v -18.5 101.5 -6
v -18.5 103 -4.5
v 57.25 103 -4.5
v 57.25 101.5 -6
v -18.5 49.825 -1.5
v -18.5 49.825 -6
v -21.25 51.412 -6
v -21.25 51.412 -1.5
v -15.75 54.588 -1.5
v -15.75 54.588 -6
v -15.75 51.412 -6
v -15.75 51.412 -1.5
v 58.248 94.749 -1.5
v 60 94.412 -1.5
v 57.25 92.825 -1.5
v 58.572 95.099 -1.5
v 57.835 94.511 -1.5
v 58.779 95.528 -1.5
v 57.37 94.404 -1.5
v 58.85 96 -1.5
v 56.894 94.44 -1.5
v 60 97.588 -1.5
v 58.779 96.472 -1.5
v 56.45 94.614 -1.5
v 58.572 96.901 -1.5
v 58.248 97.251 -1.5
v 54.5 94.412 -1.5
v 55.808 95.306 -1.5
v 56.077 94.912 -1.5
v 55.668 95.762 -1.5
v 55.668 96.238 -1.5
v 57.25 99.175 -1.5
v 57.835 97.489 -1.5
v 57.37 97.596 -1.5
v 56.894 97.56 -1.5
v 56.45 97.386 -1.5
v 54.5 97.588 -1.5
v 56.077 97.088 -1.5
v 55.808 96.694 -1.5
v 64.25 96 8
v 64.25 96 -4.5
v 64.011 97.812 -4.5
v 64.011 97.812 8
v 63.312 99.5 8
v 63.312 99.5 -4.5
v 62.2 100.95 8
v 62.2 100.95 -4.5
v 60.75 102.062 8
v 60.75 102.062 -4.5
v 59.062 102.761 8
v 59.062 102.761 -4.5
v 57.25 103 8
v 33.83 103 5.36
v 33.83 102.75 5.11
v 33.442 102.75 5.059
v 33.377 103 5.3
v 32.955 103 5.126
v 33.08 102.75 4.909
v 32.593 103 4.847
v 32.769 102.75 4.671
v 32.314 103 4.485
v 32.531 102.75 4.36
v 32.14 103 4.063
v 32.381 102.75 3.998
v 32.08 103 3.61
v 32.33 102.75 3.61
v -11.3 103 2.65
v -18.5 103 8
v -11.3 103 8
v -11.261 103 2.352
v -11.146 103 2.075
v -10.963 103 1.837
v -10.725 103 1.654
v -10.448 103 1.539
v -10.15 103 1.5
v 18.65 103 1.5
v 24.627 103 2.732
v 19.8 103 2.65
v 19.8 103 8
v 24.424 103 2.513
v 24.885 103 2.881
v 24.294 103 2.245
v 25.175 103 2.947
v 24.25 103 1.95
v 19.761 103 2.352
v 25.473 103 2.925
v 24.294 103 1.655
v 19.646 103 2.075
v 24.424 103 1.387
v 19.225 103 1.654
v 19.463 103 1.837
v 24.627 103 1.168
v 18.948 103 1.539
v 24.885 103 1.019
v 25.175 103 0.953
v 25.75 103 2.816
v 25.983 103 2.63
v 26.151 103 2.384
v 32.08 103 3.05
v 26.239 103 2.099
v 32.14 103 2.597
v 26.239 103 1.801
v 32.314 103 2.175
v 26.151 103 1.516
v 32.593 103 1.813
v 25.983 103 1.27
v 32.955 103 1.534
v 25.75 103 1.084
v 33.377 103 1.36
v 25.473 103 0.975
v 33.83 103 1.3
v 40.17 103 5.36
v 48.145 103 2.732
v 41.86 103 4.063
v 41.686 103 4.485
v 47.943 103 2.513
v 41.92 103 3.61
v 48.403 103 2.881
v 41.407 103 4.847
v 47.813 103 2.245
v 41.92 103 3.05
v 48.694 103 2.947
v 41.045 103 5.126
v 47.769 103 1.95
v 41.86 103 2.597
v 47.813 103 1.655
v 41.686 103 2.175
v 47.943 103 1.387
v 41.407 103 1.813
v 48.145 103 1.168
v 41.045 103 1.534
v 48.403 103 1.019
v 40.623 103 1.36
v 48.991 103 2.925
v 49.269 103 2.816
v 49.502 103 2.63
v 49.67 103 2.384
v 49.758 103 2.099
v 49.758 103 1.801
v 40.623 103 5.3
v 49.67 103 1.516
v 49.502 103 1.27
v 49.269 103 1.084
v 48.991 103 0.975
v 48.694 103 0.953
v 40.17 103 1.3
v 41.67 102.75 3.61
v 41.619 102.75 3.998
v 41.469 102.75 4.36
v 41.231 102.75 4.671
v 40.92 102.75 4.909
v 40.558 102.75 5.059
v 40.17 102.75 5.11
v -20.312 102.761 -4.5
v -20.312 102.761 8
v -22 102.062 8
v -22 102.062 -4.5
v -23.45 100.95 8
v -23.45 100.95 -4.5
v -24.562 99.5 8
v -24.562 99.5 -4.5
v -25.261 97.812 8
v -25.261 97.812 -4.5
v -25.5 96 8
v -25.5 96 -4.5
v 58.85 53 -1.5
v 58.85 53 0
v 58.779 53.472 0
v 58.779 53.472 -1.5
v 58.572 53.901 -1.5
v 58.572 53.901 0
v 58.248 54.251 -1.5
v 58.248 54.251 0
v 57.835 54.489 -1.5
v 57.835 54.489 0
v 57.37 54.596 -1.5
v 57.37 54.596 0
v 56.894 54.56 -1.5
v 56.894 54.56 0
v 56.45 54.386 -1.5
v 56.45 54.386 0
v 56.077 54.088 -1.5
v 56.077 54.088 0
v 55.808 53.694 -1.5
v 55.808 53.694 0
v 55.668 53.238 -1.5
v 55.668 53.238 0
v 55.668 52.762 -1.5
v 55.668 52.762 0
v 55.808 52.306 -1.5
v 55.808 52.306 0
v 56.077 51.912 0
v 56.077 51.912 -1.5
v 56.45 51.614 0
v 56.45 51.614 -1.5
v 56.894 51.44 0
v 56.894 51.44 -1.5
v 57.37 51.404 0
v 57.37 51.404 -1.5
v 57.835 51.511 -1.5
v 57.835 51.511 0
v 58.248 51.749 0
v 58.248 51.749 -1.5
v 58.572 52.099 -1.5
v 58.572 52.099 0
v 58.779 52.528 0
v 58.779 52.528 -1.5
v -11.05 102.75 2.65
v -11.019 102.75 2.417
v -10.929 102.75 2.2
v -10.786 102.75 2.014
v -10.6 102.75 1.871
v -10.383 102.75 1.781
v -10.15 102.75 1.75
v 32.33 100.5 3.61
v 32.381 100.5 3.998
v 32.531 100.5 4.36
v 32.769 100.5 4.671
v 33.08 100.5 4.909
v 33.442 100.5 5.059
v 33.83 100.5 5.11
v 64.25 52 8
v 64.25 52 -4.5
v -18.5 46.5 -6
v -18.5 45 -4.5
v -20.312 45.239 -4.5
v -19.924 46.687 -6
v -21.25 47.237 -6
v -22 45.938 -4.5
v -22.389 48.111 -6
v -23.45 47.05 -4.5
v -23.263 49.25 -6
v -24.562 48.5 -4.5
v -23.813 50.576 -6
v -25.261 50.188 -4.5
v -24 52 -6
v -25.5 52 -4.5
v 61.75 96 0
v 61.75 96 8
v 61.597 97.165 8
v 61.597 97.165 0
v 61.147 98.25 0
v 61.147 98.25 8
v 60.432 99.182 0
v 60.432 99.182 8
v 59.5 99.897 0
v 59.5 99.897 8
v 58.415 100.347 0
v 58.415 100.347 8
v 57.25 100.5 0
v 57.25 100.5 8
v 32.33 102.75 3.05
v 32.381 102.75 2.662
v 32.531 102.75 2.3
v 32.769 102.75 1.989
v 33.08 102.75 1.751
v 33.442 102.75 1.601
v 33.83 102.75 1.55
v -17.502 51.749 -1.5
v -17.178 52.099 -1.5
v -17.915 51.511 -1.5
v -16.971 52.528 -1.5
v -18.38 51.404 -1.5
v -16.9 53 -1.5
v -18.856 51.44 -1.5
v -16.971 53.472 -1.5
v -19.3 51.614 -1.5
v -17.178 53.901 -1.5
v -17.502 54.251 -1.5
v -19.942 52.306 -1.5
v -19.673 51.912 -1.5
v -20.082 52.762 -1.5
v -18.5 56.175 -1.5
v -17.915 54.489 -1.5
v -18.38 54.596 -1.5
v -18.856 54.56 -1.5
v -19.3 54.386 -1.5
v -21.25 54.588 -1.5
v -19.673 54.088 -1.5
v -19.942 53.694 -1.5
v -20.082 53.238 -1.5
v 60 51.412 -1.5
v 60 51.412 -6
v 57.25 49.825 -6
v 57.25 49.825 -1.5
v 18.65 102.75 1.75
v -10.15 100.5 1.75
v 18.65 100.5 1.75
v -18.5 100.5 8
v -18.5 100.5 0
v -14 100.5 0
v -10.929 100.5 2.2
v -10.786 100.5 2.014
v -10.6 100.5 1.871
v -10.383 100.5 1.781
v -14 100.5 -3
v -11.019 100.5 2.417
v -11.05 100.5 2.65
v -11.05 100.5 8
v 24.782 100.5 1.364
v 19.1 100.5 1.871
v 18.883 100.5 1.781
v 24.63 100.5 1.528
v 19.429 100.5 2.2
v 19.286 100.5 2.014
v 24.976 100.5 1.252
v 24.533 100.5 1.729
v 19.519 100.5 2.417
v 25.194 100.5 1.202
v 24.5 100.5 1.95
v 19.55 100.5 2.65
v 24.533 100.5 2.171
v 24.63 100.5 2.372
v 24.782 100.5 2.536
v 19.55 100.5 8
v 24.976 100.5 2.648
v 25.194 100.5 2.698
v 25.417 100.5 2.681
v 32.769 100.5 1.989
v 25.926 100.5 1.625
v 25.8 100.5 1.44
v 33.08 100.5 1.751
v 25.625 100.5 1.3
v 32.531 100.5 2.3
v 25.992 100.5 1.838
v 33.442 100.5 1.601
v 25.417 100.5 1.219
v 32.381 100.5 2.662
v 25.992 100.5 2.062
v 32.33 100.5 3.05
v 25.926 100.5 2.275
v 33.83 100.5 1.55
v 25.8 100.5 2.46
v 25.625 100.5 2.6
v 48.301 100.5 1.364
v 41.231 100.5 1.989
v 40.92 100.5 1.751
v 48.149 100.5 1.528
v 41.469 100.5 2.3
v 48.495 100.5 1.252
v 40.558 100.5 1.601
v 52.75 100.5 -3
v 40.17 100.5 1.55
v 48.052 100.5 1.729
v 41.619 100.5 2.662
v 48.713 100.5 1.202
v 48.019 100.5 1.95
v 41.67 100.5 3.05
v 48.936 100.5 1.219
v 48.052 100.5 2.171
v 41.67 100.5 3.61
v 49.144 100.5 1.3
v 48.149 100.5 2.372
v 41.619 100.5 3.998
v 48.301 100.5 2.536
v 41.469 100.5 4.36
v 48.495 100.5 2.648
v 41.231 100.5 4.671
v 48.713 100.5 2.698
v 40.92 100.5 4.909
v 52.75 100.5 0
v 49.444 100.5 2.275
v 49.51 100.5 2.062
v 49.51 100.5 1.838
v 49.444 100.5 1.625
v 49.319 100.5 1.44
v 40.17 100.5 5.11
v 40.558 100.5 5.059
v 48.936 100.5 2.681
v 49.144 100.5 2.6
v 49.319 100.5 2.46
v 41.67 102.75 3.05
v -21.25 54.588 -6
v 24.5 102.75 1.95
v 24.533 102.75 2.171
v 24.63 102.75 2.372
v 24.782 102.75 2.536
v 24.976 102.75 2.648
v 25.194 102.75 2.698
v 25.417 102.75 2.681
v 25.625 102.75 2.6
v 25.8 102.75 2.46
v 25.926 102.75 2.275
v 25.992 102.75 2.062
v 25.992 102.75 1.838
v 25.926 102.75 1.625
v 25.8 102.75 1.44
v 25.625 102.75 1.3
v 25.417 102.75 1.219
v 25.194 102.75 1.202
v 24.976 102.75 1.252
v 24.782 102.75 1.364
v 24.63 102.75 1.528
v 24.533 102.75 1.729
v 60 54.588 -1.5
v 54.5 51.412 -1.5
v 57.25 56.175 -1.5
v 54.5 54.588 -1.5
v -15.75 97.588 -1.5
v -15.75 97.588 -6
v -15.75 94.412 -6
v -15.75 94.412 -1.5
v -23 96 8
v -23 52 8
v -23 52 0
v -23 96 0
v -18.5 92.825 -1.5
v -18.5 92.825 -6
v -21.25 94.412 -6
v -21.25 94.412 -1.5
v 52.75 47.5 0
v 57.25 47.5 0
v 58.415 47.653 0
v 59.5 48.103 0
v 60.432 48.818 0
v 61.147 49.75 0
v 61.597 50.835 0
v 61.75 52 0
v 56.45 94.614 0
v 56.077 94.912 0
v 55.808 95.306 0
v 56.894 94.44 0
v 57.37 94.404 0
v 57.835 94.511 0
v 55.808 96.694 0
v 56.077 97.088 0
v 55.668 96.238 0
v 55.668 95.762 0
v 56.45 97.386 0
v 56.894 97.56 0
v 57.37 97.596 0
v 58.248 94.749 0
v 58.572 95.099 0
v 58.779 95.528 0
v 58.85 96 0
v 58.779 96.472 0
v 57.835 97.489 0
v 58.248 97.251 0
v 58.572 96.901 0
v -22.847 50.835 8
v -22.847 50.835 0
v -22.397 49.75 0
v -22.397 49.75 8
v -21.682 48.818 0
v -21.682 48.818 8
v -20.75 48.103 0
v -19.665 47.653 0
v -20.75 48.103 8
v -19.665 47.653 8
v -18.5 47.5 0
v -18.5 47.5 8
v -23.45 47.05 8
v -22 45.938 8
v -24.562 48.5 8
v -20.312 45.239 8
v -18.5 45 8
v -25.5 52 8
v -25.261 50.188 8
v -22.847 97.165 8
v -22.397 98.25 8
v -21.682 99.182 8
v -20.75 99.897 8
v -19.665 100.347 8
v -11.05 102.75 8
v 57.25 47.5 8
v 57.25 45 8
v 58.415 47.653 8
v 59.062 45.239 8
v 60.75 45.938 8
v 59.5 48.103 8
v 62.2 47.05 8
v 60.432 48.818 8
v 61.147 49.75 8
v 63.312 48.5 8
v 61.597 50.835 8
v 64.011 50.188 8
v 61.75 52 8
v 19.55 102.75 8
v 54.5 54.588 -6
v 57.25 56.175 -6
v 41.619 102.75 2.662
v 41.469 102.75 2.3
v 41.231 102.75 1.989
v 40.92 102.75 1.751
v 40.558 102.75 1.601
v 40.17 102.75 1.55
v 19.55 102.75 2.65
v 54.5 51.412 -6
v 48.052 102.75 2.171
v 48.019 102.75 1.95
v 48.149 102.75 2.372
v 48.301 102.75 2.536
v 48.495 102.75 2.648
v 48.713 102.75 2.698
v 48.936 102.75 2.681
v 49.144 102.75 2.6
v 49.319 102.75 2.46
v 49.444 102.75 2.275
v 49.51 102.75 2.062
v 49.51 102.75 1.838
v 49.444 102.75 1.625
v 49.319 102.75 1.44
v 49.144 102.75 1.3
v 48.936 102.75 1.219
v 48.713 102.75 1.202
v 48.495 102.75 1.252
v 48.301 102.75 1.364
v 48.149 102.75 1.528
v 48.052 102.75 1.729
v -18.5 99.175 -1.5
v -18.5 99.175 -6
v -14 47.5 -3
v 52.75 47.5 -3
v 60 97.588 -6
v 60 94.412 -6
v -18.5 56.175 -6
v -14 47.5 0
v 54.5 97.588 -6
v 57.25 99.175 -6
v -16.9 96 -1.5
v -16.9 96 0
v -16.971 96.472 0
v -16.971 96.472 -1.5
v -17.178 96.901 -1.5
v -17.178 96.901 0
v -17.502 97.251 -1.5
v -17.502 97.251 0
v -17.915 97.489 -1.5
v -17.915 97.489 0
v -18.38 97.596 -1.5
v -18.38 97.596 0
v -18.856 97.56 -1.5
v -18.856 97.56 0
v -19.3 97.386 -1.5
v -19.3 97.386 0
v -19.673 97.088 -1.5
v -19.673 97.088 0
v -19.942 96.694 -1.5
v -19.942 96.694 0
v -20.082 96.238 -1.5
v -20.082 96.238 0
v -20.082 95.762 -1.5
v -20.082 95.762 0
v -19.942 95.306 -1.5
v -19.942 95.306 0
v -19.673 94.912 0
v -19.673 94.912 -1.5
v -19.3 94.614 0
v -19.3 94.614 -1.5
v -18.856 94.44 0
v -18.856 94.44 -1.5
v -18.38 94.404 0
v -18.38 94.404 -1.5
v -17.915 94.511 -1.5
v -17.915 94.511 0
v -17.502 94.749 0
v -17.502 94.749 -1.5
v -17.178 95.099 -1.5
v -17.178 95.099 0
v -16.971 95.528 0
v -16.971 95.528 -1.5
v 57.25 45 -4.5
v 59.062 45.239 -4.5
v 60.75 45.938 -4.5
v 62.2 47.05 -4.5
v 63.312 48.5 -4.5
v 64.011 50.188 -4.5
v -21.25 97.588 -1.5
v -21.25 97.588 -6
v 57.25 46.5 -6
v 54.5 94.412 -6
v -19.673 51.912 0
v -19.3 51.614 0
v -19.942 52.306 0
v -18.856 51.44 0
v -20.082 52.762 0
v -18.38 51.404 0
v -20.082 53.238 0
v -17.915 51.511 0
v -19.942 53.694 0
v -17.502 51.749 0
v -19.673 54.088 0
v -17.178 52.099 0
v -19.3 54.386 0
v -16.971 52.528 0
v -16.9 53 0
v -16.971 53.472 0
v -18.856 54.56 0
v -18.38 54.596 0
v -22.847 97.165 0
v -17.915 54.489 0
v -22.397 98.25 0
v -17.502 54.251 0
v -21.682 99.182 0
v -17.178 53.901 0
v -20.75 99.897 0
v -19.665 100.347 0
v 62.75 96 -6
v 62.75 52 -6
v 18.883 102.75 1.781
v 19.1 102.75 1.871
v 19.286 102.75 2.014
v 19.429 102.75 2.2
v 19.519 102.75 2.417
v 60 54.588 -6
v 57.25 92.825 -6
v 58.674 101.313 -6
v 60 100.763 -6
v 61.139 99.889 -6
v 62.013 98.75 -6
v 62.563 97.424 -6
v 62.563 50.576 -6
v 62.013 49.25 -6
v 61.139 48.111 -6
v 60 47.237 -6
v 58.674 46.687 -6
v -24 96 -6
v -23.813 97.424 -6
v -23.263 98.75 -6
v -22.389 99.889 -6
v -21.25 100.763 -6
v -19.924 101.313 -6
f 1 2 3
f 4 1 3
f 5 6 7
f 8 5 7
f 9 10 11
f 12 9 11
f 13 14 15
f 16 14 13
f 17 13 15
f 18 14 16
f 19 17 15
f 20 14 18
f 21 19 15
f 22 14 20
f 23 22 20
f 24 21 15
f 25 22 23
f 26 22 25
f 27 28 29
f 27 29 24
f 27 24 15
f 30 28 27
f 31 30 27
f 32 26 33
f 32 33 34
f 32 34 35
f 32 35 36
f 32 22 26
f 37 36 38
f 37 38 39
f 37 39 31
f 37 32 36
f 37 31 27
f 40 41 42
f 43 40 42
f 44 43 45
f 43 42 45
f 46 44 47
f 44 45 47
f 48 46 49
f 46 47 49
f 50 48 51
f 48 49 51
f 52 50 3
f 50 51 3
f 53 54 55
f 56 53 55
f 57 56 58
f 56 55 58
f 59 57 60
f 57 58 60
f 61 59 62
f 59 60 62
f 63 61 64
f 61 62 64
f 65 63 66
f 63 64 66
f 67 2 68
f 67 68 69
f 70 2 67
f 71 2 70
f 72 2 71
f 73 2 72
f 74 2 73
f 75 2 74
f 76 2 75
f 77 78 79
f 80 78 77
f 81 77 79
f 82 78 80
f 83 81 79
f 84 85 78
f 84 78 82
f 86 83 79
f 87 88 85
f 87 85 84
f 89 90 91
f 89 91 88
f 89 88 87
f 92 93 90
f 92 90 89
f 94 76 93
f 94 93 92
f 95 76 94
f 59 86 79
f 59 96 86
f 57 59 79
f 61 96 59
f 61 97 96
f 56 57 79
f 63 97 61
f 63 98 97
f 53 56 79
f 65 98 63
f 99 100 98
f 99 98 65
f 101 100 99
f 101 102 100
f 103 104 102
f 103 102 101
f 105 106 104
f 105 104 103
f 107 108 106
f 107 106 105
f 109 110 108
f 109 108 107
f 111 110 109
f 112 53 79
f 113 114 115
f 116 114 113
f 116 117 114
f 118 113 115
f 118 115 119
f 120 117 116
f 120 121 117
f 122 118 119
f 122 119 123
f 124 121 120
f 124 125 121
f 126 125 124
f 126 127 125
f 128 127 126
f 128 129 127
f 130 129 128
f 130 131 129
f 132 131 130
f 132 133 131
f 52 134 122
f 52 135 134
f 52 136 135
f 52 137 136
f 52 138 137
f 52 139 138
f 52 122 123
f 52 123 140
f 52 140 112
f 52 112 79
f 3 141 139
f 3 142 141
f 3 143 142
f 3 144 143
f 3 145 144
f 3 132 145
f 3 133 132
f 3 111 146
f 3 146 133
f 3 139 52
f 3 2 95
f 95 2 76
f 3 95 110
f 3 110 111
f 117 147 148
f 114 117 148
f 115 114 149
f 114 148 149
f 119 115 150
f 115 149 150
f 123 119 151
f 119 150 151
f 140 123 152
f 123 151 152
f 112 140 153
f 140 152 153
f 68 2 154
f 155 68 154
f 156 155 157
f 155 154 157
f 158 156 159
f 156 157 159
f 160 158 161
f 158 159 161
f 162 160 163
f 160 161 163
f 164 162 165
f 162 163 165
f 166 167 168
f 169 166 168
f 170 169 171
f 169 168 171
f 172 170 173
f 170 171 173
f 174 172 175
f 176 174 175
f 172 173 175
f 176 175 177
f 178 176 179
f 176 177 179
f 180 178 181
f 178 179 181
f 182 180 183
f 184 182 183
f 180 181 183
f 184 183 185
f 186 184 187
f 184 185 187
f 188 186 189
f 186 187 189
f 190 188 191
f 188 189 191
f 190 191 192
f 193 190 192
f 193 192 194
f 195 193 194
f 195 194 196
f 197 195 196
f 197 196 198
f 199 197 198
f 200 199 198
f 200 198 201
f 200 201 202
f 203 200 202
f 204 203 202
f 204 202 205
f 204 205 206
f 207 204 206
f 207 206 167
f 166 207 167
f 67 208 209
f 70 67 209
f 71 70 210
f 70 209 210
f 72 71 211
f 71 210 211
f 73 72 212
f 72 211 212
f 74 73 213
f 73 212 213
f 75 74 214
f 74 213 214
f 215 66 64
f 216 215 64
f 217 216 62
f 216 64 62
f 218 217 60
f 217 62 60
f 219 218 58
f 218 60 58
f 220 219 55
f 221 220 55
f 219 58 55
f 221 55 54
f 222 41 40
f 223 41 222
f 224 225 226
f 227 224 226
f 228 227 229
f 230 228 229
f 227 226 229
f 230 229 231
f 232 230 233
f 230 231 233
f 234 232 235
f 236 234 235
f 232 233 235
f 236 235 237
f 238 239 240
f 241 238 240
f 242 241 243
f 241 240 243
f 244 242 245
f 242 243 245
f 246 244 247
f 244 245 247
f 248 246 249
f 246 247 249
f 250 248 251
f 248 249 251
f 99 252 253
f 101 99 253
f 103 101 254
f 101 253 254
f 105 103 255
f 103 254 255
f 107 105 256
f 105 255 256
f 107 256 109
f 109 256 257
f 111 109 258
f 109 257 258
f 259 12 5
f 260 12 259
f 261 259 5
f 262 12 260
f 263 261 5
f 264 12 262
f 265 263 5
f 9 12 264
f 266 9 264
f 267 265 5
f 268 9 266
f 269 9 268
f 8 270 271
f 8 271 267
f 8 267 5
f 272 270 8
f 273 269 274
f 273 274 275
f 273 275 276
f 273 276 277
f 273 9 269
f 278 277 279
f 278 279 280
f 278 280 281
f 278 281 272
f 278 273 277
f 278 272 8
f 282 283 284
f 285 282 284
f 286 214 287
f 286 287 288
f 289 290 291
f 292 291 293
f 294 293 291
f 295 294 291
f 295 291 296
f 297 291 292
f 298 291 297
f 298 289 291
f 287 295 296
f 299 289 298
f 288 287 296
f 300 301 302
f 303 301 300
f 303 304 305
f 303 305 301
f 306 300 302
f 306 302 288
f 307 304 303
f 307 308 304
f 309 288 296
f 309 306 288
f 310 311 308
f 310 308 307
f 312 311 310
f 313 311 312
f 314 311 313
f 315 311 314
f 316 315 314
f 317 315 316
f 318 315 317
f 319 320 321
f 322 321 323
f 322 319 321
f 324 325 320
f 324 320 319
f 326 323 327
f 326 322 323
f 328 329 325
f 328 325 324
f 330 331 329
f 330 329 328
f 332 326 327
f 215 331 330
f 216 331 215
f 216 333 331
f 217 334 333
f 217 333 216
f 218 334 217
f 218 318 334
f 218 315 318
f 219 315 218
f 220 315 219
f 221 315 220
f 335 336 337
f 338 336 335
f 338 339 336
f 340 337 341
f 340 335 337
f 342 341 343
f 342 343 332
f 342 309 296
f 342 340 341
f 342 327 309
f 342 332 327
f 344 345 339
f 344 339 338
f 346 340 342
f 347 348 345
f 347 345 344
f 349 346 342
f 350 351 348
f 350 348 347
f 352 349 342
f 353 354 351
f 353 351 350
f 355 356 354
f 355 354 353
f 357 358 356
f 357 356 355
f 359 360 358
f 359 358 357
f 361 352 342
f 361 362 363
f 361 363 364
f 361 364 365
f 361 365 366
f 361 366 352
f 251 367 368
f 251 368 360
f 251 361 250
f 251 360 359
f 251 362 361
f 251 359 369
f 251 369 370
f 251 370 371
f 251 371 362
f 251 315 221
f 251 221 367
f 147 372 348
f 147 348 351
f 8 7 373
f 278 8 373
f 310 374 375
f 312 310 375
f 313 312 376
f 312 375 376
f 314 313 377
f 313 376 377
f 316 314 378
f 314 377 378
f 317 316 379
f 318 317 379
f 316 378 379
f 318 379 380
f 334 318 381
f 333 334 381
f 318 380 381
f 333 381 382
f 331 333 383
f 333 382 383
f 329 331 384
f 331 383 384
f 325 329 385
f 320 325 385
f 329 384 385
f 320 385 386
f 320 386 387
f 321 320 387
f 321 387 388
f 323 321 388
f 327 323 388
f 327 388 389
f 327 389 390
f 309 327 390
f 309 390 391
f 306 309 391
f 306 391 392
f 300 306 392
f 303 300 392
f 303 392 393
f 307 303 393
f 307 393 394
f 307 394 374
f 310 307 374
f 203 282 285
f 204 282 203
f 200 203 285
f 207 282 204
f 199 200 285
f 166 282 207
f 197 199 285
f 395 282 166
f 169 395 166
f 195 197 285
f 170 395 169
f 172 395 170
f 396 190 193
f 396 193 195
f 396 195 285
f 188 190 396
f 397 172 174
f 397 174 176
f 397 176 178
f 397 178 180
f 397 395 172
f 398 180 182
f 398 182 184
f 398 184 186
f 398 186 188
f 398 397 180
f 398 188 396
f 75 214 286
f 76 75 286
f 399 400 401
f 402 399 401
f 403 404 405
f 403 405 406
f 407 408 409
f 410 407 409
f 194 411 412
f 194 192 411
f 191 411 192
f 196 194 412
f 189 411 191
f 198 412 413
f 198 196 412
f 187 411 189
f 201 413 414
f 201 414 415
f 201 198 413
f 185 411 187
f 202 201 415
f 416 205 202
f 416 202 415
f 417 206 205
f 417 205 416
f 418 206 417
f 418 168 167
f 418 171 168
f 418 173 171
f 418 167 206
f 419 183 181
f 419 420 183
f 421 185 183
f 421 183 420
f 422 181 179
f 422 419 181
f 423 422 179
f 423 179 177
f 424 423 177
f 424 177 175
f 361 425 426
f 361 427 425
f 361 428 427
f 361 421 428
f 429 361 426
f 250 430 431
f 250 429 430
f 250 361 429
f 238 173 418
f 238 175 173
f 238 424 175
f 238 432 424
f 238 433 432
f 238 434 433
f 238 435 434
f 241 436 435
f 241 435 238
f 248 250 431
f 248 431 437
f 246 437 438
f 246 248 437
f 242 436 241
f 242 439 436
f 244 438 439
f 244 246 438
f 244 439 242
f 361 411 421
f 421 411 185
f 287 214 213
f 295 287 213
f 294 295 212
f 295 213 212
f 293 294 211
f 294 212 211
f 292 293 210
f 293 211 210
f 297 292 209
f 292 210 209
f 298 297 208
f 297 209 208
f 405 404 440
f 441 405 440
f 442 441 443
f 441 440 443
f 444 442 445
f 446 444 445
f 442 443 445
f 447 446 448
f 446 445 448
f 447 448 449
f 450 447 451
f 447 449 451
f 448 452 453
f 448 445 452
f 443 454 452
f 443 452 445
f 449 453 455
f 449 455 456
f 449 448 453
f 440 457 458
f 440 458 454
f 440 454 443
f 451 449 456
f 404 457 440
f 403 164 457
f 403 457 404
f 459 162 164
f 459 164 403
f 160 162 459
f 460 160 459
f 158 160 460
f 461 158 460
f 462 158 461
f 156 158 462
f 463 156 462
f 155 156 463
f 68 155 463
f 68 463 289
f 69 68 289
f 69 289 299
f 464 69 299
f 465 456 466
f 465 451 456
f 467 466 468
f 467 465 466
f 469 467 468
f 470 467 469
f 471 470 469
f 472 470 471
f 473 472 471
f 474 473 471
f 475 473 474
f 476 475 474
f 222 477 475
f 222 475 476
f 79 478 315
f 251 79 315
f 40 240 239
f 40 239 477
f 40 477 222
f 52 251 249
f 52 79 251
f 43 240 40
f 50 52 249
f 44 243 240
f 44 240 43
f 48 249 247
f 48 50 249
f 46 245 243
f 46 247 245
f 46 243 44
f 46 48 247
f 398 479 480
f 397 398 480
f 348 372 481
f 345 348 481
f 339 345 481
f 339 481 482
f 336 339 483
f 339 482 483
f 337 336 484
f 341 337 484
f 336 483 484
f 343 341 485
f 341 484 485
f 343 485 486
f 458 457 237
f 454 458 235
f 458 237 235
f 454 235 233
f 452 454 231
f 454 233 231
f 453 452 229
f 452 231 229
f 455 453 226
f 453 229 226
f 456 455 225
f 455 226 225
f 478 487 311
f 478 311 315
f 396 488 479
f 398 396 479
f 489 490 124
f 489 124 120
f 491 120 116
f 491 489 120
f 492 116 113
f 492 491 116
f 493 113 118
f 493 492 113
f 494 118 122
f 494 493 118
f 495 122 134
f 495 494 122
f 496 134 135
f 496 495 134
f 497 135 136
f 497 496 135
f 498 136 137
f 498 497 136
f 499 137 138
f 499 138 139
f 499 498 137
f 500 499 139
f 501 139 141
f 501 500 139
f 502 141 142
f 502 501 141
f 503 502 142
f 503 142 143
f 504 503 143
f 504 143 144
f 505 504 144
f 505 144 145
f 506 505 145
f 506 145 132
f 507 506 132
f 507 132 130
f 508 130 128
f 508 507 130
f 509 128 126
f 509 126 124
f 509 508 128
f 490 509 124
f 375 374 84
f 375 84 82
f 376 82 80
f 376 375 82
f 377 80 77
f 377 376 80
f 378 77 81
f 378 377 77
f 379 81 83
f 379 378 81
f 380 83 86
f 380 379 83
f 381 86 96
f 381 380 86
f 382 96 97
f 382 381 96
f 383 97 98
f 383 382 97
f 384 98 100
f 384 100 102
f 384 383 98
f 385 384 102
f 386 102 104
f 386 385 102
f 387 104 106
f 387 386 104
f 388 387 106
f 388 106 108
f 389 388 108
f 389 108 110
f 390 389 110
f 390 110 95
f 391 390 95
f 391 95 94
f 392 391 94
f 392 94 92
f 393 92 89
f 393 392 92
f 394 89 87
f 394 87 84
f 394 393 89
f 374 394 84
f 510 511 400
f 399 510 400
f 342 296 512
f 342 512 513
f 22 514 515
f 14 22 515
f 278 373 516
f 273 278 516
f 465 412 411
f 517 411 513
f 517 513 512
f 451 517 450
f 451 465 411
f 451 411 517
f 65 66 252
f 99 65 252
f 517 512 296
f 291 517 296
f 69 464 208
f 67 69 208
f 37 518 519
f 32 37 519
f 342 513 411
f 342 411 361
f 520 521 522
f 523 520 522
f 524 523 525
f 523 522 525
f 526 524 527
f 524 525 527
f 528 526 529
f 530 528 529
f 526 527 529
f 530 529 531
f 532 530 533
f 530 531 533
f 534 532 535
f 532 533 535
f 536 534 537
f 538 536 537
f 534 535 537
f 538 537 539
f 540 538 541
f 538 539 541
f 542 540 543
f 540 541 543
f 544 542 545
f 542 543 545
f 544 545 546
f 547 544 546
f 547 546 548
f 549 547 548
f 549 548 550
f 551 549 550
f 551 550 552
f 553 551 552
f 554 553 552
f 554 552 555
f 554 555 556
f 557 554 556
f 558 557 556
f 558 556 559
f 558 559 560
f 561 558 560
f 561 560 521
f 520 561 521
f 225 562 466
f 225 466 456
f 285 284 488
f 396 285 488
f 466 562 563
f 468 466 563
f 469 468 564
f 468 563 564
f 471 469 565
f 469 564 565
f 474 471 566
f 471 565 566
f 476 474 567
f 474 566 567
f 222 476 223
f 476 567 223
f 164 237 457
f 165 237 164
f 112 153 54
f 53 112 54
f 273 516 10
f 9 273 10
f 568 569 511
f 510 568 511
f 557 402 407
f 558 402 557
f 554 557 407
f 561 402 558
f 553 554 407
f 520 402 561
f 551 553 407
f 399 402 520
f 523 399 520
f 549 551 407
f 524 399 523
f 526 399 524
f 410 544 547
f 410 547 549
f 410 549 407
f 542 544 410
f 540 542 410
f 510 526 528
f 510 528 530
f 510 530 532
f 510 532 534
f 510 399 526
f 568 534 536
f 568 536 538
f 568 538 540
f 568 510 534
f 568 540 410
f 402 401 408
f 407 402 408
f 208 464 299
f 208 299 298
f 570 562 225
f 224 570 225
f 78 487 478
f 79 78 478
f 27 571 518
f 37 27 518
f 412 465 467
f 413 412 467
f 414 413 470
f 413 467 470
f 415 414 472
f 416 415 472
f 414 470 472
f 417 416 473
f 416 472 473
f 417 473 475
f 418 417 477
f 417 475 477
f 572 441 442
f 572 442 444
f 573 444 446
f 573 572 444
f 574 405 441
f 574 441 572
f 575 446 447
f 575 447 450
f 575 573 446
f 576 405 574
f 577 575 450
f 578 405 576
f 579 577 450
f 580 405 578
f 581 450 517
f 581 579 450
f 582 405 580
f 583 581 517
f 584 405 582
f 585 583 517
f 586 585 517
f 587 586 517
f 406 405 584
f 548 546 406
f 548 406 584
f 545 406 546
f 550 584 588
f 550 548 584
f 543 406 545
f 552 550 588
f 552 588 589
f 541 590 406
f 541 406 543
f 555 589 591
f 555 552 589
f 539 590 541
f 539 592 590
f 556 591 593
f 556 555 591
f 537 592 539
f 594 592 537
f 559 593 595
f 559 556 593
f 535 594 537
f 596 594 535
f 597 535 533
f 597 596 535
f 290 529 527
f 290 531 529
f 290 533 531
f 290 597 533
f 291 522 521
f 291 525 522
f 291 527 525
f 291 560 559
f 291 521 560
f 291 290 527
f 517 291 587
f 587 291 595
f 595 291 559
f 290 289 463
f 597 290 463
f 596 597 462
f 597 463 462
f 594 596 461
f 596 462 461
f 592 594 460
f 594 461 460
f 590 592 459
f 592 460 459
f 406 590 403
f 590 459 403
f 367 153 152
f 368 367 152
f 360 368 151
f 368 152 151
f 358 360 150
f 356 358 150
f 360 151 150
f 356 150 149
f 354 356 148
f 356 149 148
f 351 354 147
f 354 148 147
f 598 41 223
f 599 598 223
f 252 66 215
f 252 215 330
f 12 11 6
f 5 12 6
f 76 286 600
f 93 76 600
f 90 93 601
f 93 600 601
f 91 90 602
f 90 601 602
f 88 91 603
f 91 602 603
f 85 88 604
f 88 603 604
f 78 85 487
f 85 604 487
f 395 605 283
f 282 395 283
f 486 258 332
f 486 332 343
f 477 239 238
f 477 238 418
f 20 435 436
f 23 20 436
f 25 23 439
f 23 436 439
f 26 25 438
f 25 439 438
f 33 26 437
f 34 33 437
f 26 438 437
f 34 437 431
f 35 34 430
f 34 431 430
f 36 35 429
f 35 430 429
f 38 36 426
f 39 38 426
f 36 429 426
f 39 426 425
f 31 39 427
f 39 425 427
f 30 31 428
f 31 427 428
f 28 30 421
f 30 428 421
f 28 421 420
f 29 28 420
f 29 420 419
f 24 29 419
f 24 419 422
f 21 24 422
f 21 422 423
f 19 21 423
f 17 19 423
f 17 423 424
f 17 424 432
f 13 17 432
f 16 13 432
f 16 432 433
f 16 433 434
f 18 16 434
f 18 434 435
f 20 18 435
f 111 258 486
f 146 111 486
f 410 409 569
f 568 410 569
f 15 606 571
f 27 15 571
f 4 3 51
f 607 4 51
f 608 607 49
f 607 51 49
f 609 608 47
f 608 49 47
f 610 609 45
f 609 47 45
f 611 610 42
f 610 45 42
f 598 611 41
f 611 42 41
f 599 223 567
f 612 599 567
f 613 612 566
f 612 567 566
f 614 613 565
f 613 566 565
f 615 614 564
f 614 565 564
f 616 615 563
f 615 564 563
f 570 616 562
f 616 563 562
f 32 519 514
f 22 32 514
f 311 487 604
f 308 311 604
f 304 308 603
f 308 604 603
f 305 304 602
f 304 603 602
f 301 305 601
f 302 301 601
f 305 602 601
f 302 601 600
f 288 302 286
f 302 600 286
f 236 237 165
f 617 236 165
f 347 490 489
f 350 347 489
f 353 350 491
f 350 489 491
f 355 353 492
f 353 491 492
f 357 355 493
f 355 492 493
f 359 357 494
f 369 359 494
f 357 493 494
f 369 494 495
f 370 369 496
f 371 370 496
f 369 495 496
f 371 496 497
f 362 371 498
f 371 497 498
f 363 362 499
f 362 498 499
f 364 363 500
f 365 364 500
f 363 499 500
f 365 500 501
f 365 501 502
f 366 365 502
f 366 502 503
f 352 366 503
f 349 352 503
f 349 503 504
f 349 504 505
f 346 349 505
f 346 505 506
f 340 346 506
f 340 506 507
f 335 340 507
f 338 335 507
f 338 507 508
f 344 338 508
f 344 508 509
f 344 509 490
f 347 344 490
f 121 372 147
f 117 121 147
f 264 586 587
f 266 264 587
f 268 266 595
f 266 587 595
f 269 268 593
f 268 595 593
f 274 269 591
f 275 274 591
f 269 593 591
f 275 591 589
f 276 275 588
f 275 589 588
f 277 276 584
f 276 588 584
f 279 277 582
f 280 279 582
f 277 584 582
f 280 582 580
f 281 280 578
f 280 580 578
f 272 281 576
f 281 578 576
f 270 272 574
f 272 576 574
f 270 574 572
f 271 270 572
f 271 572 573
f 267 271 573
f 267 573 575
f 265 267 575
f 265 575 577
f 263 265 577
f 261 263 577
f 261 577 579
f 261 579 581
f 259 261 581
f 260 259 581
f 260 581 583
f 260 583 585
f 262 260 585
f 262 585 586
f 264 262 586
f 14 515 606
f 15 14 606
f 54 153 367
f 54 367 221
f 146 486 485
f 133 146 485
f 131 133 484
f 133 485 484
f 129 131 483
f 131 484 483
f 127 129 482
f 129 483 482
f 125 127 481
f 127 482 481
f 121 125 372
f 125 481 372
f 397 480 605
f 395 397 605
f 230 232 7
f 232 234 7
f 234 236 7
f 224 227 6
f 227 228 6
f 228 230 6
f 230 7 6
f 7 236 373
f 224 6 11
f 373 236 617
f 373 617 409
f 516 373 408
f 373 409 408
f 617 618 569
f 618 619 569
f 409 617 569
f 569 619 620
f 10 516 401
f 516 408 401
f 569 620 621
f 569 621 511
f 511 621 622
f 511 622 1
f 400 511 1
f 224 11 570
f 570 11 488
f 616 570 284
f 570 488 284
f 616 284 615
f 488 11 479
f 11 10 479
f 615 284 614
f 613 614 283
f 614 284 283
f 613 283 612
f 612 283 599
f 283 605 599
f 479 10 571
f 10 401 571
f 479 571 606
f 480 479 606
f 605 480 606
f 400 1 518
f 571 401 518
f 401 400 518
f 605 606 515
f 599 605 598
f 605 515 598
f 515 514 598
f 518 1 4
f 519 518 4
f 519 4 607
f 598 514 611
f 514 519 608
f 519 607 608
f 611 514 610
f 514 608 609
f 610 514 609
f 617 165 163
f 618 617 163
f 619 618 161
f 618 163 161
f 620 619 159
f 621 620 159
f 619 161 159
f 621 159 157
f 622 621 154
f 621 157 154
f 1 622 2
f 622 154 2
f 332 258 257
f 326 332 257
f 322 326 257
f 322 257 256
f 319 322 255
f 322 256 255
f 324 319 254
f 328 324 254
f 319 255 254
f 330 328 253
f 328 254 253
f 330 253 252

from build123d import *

# Parameters (mm, degrees)
PAD_DEPTH       = 14
POCKET_DEPTH    = 13
SKETCH002_R     = 0.75
POCKET001_DEPTH = 5
SKETCH003_W     = 9
SKETCH003_H     = 54
PAD001_DEPTH    = 6
SKETCH004_R     = 1.6
POCKET002_DEPTH = 10
POCKET003_DEPTH = 4.5
CHAMFER001_SIZE = 1.5
CHAMFER003_SIZE = 0.25


with BuildPart() as part:
    # Sketch → Pad (new body)
    with BuildSketch(Plane.XY.offset(-6)):
        with BuildLine():
            ThreePointArc((-18.5, 103), (-23.449747, 100.949747), (-25.5, 96))
            Line((-25.5, 52), (-25.5, 96))
            ThreePointArc((-25.5, 52), (-23.449747, 47.050253), (-18.5, 45))
            Line((57.25, 45), (-18.5, 45))
            ThreePointArc((57.25, 45), (62.199747, 47.050253), (64.25, 52))
            Line((64.25, 96), (64.25, 52))
            ThreePointArc((64.25, 96), (62.199747, 100.949747), (57.25, 103))
            Line((-18.5, 103), (57.25, 103))
        make_face()
    extrude(amount=PAD_DEPTH)

    # Sketch001 → Pocket (cut)
    with BuildSketch(Plane.XY.offset(10)):
        with BuildLine():
            ThreePointArc((-18.5, 100.5), (-21.681981, 99.181981), (-23, 96))
            Line((-23, 52), (-23, 96))
            ThreePointArc((-23, 52), (-21.681981, 48.818019), (-18.5, 47.5))
            Line((57.25, 47.5), (-18.5, 47.5))
            ThreePointArc((57.25, 47.5), (60.431981, 48.818019), (61.75, 52))
            Line((61.75, 96), (61.75, 52))
            ThreePointArc((61.75, 96), (60.431981, 99.181981), (57.25, 100.5))
            Line((-18.5, 100.5), (57.25, 100.5))
        make_face()
    extrude(amount=-POCKET_DEPTH, mode=Mode.SUBTRACT)

    # Sketch002 → Pocket001 (cut)
    with BuildSketch(Plane(origin=(0, 104, 0), x_dir=(-1, 0, 0), z_dir=(0, 1, 0))):
        with Locations((-48.76875, 1.95)):
            Circle(SKETCH002_R)
        with Locations((-25.25, 1.95)):
            Circle(SKETCH002_R)
        with BuildLine():
            ThreePointArc((-40.17, 5.11), (-41.23066, 4.67066), (-41.67, 3.61))
            Line((-41.67, 3.05), (-41.67, 3.61))
            ThreePointArc((-41.67, 3.05), (-41.23066, 1.98934), (-40.17, 1.55))
            Line((-33.83, 1.55), (-40.17, 1.55))
            ThreePointArc((-33.83, 1.55), (-32.76934, 1.98934), (-32.33, 3.05))
            Line((-32.33, 3.61), (-32.33, 3.05))
            ThreePointArc((-32.33, 3.61), (-32.76934, 4.67066), (-33.83, 5.11))
            Line((-40.17, 5.11), (-33.83, 5.11))
        make_face()
        with BuildLine():
            ThreePointArc((-18.65, 14.05), (-19.286396, 13.786396), (-19.55, 13.15))
            Line((-19.55, 2.65), (-19.55, 13.15))
            ThreePointArc((-19.55, 2.65), (-19.286396, 2.013604), (-18.65, 1.75))
            Line((10.15, 1.75), (-18.65, 1.75))
            ThreePointArc((10.15, 1.75), (10.786396, 2.013604), (11.05, 2.65))
            Line((11.05, 13.15), (11.05, 2.65))
            ThreePointArc((11.05, 13.15), (10.786396, 13.786396), (10.15, 14.05))
            Line((-18.65, 14.05), (10.15, 14.05))
        make_face()
    extrude(amount=-POCKET001_DEPTH, mode=Mode.SUBTRACT)

    # Sketch003 → Pad001 (join)
    with BuildSketch(Plane.XY.offset(-6)):
        with Locations((-18.5, 74)):
            Rectangle(SKETCH003_W, SKETCH003_H)
        with Locations((57.25, 74)):
            Rectangle(SKETCH003_W, SKETCH003_H)
    extrude(amount=PAD001_DEPTH)

    # Sketch004 → Pocket002 (cut)
    with BuildSketch(Plane.XY):
        with Locations((-18.5, 96)):
            Circle(SKETCH004_R)
        with Locations((-18.5, 53)):
            Circle(SKETCH004_R)
        with Locations((57.25, 53)):
            Circle(SKETCH004_R)
        with Locations((57.25, 96)):
            Circle(SKETCH004_R)
    extrude(amount=-POCKET002_DEPTH, mode=Mode.SUBTRACT)

    # Sketch005 → Pocket003 (cut)
    with BuildSketch(Plane(origin=(0, 0, -6), x_dir=(-1, 0, 0), z_dir=(0, 0, -1))):
        Polygon((21.25, 94.412287), (21.25, 97.587713), (18.5, 99.175426), (15.75, 97.587713), (15.75, 94.412287), (18.5, 92.824574), align=None)
        Polygon((21.25, 51.412287), (21.25, 54.587713), (18.5, 56.175426), (15.75, 54.587713), (15.75, 51.412287), (18.5, 49.824574), align=None)
        Polygon((-54.5, 54.587713), (-57.25, 56.175426), (-60, 54.587713), (-60, 51.412287), (-57.25, 49.824574), (-54.5, 51.412287), align=None)
        Polygon((-54.5, 94.412287), (-54.5, 97.587713), (-57.25, 99.175426), (-60, 97.587713), (-60, 94.412287), (-57.25, 92.824574), align=None)
    extrude(amount=-POCKET003_DEPTH, mode=Mode.SUBTRACT)

    # Chamfer001
    chamfer001_edges = [part.edges().sort_by_distance(p)[0] for p in [
        (64.25, 74, -6),
    ]]
    chamfer(chamfer001_edges, length=CHAMFER001_SIZE)

    # Chamfer003
    chamfer003_edges = [part.edges().sort_by_distance(p)[0] for p in [
        (49.51875, 103, 1.95),
        (37, 103, 5.11),
        (26, 103, 1.95),
        (19.55, 103, 5.325),
    ]]
    chamfer(chamfer003_edges, length=CHAMFER003_SIZE)


solid = part.part
